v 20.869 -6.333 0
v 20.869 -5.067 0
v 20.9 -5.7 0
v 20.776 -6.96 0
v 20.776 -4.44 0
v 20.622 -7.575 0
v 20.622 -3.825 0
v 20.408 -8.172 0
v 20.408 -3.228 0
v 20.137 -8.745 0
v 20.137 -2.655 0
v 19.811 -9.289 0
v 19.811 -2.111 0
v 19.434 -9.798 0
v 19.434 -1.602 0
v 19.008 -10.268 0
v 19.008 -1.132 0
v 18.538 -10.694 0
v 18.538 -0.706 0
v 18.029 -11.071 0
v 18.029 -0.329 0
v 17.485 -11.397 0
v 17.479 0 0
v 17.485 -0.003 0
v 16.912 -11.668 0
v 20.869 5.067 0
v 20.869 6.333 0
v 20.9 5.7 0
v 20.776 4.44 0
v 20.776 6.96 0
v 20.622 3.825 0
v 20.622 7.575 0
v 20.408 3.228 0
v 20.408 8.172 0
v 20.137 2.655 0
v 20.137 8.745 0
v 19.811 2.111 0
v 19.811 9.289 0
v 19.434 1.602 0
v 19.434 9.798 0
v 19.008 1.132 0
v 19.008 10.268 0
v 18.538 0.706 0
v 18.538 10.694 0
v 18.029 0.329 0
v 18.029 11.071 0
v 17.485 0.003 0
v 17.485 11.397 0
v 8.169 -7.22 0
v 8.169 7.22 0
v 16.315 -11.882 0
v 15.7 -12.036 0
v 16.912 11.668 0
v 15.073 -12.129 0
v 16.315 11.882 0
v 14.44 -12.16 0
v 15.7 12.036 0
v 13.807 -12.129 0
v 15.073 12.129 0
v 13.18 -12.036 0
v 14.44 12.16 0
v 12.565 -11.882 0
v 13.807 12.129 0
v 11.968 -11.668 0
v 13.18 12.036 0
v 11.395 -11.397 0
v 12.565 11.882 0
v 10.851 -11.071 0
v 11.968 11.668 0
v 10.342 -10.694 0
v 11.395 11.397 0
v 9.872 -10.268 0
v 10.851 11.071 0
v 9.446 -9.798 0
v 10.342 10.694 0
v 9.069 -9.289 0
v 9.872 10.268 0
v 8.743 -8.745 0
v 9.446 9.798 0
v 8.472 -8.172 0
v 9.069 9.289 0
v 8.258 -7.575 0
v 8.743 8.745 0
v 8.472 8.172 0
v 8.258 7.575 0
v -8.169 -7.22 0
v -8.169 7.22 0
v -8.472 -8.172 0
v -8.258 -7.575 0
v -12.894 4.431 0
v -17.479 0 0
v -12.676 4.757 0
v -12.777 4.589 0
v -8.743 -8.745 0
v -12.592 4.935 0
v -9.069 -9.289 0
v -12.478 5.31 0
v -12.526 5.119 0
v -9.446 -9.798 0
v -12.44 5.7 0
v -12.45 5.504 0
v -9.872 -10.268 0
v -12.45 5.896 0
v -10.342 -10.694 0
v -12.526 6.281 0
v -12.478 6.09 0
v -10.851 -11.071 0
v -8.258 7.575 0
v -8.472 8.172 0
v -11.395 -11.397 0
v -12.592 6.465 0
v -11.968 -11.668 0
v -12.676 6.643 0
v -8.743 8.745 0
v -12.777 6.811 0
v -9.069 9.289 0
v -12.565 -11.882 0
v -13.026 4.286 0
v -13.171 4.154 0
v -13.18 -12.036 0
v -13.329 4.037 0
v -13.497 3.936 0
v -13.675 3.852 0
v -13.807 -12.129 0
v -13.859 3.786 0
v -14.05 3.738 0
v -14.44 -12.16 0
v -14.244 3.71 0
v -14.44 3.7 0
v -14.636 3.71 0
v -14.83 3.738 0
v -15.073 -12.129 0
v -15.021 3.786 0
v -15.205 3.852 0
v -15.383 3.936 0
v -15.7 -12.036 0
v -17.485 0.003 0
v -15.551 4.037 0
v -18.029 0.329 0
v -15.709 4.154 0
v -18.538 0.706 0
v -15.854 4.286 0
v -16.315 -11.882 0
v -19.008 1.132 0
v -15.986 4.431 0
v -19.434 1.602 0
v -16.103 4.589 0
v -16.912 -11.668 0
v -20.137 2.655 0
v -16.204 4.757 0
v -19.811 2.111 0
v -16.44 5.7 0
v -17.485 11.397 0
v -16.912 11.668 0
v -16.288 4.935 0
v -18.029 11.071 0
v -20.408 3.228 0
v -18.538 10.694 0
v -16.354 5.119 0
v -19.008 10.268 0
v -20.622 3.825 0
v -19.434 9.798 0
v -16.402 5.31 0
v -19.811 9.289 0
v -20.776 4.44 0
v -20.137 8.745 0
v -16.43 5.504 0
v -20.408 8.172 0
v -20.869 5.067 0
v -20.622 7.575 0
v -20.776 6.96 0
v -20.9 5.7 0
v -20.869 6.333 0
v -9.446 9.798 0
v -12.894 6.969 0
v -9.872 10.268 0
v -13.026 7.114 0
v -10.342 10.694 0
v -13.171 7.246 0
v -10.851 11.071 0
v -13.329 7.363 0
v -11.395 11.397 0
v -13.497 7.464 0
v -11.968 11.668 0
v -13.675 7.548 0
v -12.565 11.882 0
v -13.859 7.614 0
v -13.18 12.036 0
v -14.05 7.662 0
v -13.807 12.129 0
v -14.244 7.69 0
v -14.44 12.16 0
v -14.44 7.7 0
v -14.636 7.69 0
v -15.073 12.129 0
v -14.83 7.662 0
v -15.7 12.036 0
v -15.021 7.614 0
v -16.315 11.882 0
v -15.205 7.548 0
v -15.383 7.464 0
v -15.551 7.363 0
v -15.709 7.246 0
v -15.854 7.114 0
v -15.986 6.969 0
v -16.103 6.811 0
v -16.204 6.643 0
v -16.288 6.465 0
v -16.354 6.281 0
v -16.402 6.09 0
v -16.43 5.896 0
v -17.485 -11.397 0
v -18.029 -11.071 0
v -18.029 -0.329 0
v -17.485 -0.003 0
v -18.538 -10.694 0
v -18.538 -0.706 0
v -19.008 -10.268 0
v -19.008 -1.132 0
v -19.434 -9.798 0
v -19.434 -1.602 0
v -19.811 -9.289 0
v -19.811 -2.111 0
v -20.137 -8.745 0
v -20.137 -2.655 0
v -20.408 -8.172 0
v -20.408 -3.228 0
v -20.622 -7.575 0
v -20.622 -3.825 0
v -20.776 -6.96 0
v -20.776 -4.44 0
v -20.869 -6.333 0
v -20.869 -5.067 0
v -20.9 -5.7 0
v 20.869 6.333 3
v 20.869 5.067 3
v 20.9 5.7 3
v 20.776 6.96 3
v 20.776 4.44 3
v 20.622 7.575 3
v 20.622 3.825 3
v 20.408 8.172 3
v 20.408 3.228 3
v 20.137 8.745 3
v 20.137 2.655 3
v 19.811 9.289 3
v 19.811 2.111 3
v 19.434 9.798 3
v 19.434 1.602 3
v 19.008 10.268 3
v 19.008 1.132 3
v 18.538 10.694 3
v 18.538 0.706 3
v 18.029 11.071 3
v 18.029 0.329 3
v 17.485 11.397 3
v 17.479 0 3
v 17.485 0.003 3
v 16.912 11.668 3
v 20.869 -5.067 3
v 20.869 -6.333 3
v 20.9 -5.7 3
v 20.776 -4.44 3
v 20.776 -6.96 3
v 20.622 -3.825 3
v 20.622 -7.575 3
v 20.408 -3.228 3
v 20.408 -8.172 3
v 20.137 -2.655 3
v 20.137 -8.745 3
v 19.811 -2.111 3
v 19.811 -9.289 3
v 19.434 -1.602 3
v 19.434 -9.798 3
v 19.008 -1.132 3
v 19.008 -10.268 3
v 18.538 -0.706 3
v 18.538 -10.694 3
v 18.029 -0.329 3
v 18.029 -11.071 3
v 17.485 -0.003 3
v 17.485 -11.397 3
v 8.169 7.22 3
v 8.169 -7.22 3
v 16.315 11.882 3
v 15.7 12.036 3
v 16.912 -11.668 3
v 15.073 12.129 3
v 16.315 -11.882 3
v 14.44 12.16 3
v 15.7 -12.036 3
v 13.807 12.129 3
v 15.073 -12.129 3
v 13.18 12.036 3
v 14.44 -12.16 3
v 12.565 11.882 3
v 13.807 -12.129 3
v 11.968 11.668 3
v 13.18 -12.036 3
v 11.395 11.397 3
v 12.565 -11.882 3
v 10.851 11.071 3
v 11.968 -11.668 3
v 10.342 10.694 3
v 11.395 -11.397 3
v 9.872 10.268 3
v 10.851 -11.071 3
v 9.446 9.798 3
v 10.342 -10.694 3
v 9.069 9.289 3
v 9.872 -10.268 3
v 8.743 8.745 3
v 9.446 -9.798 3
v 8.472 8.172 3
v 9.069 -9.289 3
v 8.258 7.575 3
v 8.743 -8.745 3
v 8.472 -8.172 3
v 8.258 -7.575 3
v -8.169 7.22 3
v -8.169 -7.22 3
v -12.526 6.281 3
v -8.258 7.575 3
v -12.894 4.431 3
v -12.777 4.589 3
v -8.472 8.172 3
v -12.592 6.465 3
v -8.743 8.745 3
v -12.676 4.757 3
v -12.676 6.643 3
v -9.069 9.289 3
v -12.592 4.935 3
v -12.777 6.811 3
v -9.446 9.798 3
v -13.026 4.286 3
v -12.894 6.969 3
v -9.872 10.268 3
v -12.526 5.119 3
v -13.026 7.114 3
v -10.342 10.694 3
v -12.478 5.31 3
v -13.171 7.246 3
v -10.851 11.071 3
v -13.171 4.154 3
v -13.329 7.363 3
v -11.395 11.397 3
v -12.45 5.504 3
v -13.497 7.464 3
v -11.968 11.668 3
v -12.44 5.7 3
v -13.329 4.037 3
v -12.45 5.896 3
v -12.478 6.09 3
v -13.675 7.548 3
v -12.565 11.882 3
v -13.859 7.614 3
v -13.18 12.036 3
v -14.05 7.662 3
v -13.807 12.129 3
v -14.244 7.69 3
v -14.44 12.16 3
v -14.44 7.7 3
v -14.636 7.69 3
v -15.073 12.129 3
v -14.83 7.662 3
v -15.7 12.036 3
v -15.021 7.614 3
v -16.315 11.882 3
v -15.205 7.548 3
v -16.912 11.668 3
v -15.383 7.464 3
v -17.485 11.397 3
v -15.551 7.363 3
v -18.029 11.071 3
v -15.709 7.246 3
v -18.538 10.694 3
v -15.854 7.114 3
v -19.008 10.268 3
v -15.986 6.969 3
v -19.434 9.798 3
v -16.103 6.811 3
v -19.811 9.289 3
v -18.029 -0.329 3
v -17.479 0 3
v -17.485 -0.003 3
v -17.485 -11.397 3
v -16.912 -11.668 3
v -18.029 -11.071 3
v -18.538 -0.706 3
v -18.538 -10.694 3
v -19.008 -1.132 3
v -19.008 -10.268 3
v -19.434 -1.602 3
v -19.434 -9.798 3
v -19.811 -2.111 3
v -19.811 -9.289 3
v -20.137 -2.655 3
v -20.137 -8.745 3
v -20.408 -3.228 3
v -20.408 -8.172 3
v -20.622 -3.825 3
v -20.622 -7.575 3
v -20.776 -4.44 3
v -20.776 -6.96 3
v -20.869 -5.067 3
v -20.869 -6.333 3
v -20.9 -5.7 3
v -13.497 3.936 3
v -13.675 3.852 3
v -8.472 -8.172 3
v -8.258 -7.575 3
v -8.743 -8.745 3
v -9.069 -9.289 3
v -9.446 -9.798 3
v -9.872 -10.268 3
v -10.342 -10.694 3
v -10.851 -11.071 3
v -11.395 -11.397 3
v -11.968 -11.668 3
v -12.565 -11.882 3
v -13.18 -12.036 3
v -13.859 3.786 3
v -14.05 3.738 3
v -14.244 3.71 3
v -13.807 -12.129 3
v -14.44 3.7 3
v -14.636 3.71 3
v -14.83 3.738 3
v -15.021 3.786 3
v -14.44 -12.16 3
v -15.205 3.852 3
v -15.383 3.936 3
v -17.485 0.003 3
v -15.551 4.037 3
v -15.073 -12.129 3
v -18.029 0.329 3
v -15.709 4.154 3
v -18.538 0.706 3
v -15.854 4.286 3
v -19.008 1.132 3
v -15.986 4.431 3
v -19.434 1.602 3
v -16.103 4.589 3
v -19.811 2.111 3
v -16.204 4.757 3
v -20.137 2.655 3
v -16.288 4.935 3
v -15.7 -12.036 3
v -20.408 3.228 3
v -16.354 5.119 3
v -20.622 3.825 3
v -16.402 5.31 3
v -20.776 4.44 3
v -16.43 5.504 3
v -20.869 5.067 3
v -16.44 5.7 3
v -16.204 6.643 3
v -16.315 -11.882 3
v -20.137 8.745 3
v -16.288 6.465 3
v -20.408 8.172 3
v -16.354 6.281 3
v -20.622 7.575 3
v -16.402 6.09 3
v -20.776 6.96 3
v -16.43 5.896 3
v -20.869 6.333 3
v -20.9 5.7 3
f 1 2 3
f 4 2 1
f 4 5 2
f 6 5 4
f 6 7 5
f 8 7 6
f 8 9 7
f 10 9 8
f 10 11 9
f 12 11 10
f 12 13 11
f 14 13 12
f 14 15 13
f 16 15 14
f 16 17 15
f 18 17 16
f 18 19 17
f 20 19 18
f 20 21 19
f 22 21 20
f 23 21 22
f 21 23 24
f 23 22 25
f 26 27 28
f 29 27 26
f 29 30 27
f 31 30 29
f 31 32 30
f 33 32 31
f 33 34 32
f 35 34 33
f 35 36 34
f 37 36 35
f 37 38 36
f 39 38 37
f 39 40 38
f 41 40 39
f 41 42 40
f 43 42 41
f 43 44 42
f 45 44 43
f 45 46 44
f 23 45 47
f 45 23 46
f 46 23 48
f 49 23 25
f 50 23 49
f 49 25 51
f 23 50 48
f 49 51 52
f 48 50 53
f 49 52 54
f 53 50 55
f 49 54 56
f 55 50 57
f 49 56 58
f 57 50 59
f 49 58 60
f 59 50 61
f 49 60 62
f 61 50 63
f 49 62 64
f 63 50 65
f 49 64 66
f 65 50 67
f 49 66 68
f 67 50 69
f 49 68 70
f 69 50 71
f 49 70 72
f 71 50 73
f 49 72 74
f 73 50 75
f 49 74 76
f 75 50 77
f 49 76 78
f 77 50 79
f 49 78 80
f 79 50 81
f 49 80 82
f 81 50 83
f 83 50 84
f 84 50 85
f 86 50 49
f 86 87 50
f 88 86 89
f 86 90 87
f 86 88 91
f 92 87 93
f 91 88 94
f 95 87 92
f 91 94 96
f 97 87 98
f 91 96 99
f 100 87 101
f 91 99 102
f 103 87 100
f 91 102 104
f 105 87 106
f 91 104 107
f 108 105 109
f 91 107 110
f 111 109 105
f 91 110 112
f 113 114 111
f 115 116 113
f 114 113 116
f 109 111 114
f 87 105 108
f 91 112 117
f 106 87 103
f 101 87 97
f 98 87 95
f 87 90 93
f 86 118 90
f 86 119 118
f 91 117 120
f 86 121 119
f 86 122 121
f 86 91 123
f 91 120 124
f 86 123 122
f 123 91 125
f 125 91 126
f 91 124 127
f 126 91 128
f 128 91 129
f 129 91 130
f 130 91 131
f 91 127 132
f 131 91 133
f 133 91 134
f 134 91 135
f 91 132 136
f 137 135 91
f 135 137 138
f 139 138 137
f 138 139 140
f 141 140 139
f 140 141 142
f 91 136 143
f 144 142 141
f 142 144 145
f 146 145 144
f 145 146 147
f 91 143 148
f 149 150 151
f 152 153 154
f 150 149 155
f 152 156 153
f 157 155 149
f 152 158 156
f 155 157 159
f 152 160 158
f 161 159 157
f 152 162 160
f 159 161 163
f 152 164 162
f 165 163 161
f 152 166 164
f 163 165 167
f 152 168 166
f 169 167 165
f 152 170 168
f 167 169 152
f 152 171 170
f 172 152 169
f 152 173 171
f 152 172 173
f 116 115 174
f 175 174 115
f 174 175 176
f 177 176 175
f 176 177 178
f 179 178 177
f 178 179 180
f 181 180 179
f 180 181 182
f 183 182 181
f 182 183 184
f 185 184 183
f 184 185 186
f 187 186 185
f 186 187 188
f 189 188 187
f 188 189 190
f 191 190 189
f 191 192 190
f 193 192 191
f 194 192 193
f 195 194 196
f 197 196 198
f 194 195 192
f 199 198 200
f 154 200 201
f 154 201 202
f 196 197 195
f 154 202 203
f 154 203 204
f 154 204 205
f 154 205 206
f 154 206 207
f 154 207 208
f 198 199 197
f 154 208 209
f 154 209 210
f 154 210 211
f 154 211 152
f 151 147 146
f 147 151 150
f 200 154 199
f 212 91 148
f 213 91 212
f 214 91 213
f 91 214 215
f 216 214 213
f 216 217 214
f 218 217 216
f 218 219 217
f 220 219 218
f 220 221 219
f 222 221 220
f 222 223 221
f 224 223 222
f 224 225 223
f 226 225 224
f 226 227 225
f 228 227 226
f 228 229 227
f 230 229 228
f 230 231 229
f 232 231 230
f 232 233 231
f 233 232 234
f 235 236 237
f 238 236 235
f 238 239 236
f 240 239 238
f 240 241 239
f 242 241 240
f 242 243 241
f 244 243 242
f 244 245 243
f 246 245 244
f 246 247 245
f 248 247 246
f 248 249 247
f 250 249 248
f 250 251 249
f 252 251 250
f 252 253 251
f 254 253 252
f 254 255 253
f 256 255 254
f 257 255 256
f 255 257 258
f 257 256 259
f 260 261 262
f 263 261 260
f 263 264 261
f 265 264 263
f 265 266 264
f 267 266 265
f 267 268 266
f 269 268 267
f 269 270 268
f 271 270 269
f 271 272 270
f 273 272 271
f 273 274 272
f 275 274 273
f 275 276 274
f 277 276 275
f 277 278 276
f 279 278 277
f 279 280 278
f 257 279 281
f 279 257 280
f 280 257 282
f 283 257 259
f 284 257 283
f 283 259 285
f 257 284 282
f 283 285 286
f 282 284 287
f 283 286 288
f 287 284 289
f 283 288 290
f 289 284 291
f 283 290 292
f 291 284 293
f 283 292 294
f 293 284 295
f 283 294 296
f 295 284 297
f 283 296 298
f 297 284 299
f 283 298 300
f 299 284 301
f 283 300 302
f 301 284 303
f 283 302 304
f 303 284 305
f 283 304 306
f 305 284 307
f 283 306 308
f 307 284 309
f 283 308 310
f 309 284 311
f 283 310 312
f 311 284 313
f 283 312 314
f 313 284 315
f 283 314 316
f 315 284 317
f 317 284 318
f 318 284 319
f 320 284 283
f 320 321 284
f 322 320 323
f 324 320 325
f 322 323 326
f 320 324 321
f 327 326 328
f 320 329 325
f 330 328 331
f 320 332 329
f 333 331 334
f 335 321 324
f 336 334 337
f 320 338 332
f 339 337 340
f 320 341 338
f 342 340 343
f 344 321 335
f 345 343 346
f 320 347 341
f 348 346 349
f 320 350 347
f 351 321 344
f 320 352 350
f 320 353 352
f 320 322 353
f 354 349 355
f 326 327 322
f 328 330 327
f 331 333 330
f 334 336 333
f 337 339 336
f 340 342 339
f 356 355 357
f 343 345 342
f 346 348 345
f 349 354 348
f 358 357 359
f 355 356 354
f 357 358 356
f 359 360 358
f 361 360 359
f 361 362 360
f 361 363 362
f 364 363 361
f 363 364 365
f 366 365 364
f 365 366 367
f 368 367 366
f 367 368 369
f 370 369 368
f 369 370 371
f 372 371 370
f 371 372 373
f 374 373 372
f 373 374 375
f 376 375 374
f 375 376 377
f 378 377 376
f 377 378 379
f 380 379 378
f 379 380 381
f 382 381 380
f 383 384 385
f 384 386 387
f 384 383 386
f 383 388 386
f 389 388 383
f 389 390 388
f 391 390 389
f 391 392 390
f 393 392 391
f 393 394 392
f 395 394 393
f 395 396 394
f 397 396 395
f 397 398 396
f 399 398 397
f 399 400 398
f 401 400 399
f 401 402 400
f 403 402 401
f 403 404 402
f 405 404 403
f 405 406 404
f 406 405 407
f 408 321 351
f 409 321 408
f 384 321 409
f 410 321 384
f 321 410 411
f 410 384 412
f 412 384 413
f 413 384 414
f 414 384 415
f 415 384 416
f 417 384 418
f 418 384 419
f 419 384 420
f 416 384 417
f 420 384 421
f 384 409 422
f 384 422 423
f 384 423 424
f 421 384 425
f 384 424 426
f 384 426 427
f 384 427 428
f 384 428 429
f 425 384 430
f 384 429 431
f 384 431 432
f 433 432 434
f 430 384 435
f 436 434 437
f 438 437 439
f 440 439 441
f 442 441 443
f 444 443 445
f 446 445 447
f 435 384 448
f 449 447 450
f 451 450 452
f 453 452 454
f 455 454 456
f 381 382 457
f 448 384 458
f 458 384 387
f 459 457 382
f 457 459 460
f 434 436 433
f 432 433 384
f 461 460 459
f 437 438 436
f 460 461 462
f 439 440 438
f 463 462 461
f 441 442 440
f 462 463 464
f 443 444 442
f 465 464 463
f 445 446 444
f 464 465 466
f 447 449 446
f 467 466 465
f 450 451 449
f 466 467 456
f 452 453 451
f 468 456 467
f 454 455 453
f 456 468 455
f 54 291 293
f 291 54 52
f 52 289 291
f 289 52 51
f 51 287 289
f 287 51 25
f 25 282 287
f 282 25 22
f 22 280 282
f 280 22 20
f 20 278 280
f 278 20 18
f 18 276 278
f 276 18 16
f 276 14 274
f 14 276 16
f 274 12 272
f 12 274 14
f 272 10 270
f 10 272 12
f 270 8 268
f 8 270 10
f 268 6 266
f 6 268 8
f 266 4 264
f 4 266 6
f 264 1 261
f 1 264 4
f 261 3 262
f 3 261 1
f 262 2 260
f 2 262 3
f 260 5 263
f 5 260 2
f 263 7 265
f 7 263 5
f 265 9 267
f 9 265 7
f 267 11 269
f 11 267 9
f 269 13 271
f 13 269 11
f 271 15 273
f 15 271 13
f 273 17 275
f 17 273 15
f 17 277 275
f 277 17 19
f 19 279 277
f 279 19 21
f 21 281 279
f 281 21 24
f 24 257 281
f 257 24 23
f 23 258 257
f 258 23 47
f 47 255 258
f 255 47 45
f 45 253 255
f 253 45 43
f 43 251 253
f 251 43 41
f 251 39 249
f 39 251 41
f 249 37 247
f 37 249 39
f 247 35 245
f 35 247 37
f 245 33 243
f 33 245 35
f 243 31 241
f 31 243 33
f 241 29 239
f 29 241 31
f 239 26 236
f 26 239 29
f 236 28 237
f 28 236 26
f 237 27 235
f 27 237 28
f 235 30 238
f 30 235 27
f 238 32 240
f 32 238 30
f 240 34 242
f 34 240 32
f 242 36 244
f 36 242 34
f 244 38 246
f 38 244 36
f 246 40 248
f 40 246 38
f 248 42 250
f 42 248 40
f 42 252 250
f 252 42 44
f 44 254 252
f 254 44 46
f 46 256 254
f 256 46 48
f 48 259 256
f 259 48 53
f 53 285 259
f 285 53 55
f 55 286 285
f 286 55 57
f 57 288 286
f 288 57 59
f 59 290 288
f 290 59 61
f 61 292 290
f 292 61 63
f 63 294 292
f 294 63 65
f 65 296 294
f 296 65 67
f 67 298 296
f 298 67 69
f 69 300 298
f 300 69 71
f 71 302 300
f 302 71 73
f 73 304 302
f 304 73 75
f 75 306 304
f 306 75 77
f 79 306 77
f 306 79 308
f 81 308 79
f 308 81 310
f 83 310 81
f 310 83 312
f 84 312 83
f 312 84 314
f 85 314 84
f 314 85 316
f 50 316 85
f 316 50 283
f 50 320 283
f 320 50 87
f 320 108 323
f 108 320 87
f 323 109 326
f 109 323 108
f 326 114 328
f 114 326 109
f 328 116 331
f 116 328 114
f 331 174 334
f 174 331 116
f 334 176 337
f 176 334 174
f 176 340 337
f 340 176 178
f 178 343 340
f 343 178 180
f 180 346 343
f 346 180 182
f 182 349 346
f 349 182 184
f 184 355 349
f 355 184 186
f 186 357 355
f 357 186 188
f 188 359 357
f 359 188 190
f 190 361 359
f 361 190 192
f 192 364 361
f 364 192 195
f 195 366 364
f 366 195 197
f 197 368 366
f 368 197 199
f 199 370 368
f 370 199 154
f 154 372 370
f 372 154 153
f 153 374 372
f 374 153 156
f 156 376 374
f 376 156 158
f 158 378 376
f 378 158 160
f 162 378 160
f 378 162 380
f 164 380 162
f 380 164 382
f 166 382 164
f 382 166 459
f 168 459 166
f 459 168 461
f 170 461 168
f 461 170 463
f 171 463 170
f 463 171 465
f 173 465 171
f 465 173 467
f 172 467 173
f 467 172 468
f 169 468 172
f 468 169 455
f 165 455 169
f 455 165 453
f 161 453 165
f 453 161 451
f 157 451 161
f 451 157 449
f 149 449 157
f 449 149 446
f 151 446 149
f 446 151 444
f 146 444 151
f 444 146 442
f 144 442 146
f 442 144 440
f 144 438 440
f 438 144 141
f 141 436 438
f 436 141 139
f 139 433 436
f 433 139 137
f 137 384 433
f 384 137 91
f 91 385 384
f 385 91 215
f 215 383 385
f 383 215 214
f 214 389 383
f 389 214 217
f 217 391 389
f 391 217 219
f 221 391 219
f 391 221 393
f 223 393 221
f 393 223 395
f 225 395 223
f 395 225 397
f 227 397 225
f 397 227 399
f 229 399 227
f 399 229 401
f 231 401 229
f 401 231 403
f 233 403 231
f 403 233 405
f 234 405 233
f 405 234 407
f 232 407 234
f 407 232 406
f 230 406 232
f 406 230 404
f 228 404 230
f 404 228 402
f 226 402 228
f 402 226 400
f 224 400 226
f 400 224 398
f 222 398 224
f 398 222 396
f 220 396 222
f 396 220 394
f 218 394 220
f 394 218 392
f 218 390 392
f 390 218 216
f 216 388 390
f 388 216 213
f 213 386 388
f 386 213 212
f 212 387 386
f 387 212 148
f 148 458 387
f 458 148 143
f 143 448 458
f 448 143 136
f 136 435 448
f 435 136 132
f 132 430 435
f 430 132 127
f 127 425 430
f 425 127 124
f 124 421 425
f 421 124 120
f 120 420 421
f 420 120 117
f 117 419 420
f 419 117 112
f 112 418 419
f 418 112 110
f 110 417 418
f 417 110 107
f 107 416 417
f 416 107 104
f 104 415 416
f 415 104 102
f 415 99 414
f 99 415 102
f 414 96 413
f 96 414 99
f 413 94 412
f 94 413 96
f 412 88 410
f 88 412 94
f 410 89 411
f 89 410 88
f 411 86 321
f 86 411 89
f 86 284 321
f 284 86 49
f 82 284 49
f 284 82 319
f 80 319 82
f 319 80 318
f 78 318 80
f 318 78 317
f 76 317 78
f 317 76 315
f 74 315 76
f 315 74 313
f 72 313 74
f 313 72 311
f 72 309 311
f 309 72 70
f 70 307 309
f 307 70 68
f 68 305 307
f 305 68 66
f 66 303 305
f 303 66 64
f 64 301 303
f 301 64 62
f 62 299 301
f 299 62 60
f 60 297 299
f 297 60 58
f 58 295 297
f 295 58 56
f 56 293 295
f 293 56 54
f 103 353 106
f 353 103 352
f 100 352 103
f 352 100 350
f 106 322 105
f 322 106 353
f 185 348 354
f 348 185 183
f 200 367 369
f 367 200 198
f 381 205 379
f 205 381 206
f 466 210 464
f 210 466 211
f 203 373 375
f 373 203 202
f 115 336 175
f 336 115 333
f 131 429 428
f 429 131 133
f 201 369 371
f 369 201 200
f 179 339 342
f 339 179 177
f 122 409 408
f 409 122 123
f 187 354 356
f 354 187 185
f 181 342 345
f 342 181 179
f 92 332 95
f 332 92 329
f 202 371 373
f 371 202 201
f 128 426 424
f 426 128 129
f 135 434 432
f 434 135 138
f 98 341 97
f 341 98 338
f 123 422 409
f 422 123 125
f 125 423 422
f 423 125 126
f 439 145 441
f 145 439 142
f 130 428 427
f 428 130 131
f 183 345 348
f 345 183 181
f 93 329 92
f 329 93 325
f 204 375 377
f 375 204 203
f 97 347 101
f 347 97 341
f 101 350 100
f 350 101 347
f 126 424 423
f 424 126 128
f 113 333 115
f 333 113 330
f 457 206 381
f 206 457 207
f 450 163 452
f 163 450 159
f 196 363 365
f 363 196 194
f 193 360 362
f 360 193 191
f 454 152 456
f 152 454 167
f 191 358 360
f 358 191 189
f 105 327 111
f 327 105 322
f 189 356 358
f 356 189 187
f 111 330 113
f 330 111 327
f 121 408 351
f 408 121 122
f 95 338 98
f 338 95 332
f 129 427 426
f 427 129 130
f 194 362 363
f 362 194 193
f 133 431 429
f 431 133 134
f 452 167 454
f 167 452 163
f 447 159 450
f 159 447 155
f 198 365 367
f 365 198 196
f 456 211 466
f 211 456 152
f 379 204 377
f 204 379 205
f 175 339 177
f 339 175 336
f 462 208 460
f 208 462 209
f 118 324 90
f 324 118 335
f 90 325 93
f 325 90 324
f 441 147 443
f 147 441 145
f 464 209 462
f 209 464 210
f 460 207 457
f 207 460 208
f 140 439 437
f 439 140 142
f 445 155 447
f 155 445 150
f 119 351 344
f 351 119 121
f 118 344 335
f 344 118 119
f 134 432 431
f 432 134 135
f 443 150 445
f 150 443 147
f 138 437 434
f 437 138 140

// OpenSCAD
// Tag de pet (coleira) — modelo próprio do Multiferramenta 3D
// Partes: "base" e "texto"
nome = "Thor"; telefone = "(27) 99999-9999"; fonte = "Luckiest Guy";
formato = "osso";                       // osso | circulo | coracao
tamanho = 38; esp = 3; relevo = 1; furo = 4;
parte = "base";
$fn = 64;

module forma() {
  if (formato == "osso") { square([tamanho * 0.75, tamanho * 0.38], center = true);
    for (x = [-1, 1], y = [-1, 1]) translate([x * tamanho * 0.38, y * tamanho * 0.15]) circle(d = tamanho * 0.34); }
  else if (formato == "coracao") translate([0, -tamanho * 0.08]) rotate(45) { square(tamanho * 0.55, center = true);
    translate([0, tamanho * 0.275]) circle(d = tamanho * 0.55); translate([tamanho * 0.275, 0]) circle(d = tamanho * 0.55); }
  else circle(d = tamanho);
}
furo_pos = formato == "osso" ? [-tamanho * 0.38, tamanho * 0.15] : formato == "coracao" ? [-tamanho * 0.194, tamanho * 0.389 - furo / 2 - 2.2] : [0, tamanho / 2 - furo / 2 - 2];
lar = formato == "osso" ? tamanho * 0.62 : tamanho * 0.7;
module textos() {
  translate([0, formato == "osso" ? 1.5 : 2]) resize([lar, 0], auto = true) text(nome, font = fonte, size = 10, halign = "center", valign = "center");
  if (len(telefone) > 0) translate([0, formato == "osso" ? -4.5 : -tamanho * 0.2]) resize([lar * 0.9, 0], auto = true) text(telefone, font = "Poppins:style=Bold", size = 4, halign = "center", valign = "center");
}
if (parte == "base") difference() { linear_extrude(esp) forma(); translate([furo_pos[0], furo_pos[1], -1]) cylinder(d = furo, h = esp + 2); }
else if (parte == "texto") translate([0, 0, esp]) linear_extrude(relevo) textos();
